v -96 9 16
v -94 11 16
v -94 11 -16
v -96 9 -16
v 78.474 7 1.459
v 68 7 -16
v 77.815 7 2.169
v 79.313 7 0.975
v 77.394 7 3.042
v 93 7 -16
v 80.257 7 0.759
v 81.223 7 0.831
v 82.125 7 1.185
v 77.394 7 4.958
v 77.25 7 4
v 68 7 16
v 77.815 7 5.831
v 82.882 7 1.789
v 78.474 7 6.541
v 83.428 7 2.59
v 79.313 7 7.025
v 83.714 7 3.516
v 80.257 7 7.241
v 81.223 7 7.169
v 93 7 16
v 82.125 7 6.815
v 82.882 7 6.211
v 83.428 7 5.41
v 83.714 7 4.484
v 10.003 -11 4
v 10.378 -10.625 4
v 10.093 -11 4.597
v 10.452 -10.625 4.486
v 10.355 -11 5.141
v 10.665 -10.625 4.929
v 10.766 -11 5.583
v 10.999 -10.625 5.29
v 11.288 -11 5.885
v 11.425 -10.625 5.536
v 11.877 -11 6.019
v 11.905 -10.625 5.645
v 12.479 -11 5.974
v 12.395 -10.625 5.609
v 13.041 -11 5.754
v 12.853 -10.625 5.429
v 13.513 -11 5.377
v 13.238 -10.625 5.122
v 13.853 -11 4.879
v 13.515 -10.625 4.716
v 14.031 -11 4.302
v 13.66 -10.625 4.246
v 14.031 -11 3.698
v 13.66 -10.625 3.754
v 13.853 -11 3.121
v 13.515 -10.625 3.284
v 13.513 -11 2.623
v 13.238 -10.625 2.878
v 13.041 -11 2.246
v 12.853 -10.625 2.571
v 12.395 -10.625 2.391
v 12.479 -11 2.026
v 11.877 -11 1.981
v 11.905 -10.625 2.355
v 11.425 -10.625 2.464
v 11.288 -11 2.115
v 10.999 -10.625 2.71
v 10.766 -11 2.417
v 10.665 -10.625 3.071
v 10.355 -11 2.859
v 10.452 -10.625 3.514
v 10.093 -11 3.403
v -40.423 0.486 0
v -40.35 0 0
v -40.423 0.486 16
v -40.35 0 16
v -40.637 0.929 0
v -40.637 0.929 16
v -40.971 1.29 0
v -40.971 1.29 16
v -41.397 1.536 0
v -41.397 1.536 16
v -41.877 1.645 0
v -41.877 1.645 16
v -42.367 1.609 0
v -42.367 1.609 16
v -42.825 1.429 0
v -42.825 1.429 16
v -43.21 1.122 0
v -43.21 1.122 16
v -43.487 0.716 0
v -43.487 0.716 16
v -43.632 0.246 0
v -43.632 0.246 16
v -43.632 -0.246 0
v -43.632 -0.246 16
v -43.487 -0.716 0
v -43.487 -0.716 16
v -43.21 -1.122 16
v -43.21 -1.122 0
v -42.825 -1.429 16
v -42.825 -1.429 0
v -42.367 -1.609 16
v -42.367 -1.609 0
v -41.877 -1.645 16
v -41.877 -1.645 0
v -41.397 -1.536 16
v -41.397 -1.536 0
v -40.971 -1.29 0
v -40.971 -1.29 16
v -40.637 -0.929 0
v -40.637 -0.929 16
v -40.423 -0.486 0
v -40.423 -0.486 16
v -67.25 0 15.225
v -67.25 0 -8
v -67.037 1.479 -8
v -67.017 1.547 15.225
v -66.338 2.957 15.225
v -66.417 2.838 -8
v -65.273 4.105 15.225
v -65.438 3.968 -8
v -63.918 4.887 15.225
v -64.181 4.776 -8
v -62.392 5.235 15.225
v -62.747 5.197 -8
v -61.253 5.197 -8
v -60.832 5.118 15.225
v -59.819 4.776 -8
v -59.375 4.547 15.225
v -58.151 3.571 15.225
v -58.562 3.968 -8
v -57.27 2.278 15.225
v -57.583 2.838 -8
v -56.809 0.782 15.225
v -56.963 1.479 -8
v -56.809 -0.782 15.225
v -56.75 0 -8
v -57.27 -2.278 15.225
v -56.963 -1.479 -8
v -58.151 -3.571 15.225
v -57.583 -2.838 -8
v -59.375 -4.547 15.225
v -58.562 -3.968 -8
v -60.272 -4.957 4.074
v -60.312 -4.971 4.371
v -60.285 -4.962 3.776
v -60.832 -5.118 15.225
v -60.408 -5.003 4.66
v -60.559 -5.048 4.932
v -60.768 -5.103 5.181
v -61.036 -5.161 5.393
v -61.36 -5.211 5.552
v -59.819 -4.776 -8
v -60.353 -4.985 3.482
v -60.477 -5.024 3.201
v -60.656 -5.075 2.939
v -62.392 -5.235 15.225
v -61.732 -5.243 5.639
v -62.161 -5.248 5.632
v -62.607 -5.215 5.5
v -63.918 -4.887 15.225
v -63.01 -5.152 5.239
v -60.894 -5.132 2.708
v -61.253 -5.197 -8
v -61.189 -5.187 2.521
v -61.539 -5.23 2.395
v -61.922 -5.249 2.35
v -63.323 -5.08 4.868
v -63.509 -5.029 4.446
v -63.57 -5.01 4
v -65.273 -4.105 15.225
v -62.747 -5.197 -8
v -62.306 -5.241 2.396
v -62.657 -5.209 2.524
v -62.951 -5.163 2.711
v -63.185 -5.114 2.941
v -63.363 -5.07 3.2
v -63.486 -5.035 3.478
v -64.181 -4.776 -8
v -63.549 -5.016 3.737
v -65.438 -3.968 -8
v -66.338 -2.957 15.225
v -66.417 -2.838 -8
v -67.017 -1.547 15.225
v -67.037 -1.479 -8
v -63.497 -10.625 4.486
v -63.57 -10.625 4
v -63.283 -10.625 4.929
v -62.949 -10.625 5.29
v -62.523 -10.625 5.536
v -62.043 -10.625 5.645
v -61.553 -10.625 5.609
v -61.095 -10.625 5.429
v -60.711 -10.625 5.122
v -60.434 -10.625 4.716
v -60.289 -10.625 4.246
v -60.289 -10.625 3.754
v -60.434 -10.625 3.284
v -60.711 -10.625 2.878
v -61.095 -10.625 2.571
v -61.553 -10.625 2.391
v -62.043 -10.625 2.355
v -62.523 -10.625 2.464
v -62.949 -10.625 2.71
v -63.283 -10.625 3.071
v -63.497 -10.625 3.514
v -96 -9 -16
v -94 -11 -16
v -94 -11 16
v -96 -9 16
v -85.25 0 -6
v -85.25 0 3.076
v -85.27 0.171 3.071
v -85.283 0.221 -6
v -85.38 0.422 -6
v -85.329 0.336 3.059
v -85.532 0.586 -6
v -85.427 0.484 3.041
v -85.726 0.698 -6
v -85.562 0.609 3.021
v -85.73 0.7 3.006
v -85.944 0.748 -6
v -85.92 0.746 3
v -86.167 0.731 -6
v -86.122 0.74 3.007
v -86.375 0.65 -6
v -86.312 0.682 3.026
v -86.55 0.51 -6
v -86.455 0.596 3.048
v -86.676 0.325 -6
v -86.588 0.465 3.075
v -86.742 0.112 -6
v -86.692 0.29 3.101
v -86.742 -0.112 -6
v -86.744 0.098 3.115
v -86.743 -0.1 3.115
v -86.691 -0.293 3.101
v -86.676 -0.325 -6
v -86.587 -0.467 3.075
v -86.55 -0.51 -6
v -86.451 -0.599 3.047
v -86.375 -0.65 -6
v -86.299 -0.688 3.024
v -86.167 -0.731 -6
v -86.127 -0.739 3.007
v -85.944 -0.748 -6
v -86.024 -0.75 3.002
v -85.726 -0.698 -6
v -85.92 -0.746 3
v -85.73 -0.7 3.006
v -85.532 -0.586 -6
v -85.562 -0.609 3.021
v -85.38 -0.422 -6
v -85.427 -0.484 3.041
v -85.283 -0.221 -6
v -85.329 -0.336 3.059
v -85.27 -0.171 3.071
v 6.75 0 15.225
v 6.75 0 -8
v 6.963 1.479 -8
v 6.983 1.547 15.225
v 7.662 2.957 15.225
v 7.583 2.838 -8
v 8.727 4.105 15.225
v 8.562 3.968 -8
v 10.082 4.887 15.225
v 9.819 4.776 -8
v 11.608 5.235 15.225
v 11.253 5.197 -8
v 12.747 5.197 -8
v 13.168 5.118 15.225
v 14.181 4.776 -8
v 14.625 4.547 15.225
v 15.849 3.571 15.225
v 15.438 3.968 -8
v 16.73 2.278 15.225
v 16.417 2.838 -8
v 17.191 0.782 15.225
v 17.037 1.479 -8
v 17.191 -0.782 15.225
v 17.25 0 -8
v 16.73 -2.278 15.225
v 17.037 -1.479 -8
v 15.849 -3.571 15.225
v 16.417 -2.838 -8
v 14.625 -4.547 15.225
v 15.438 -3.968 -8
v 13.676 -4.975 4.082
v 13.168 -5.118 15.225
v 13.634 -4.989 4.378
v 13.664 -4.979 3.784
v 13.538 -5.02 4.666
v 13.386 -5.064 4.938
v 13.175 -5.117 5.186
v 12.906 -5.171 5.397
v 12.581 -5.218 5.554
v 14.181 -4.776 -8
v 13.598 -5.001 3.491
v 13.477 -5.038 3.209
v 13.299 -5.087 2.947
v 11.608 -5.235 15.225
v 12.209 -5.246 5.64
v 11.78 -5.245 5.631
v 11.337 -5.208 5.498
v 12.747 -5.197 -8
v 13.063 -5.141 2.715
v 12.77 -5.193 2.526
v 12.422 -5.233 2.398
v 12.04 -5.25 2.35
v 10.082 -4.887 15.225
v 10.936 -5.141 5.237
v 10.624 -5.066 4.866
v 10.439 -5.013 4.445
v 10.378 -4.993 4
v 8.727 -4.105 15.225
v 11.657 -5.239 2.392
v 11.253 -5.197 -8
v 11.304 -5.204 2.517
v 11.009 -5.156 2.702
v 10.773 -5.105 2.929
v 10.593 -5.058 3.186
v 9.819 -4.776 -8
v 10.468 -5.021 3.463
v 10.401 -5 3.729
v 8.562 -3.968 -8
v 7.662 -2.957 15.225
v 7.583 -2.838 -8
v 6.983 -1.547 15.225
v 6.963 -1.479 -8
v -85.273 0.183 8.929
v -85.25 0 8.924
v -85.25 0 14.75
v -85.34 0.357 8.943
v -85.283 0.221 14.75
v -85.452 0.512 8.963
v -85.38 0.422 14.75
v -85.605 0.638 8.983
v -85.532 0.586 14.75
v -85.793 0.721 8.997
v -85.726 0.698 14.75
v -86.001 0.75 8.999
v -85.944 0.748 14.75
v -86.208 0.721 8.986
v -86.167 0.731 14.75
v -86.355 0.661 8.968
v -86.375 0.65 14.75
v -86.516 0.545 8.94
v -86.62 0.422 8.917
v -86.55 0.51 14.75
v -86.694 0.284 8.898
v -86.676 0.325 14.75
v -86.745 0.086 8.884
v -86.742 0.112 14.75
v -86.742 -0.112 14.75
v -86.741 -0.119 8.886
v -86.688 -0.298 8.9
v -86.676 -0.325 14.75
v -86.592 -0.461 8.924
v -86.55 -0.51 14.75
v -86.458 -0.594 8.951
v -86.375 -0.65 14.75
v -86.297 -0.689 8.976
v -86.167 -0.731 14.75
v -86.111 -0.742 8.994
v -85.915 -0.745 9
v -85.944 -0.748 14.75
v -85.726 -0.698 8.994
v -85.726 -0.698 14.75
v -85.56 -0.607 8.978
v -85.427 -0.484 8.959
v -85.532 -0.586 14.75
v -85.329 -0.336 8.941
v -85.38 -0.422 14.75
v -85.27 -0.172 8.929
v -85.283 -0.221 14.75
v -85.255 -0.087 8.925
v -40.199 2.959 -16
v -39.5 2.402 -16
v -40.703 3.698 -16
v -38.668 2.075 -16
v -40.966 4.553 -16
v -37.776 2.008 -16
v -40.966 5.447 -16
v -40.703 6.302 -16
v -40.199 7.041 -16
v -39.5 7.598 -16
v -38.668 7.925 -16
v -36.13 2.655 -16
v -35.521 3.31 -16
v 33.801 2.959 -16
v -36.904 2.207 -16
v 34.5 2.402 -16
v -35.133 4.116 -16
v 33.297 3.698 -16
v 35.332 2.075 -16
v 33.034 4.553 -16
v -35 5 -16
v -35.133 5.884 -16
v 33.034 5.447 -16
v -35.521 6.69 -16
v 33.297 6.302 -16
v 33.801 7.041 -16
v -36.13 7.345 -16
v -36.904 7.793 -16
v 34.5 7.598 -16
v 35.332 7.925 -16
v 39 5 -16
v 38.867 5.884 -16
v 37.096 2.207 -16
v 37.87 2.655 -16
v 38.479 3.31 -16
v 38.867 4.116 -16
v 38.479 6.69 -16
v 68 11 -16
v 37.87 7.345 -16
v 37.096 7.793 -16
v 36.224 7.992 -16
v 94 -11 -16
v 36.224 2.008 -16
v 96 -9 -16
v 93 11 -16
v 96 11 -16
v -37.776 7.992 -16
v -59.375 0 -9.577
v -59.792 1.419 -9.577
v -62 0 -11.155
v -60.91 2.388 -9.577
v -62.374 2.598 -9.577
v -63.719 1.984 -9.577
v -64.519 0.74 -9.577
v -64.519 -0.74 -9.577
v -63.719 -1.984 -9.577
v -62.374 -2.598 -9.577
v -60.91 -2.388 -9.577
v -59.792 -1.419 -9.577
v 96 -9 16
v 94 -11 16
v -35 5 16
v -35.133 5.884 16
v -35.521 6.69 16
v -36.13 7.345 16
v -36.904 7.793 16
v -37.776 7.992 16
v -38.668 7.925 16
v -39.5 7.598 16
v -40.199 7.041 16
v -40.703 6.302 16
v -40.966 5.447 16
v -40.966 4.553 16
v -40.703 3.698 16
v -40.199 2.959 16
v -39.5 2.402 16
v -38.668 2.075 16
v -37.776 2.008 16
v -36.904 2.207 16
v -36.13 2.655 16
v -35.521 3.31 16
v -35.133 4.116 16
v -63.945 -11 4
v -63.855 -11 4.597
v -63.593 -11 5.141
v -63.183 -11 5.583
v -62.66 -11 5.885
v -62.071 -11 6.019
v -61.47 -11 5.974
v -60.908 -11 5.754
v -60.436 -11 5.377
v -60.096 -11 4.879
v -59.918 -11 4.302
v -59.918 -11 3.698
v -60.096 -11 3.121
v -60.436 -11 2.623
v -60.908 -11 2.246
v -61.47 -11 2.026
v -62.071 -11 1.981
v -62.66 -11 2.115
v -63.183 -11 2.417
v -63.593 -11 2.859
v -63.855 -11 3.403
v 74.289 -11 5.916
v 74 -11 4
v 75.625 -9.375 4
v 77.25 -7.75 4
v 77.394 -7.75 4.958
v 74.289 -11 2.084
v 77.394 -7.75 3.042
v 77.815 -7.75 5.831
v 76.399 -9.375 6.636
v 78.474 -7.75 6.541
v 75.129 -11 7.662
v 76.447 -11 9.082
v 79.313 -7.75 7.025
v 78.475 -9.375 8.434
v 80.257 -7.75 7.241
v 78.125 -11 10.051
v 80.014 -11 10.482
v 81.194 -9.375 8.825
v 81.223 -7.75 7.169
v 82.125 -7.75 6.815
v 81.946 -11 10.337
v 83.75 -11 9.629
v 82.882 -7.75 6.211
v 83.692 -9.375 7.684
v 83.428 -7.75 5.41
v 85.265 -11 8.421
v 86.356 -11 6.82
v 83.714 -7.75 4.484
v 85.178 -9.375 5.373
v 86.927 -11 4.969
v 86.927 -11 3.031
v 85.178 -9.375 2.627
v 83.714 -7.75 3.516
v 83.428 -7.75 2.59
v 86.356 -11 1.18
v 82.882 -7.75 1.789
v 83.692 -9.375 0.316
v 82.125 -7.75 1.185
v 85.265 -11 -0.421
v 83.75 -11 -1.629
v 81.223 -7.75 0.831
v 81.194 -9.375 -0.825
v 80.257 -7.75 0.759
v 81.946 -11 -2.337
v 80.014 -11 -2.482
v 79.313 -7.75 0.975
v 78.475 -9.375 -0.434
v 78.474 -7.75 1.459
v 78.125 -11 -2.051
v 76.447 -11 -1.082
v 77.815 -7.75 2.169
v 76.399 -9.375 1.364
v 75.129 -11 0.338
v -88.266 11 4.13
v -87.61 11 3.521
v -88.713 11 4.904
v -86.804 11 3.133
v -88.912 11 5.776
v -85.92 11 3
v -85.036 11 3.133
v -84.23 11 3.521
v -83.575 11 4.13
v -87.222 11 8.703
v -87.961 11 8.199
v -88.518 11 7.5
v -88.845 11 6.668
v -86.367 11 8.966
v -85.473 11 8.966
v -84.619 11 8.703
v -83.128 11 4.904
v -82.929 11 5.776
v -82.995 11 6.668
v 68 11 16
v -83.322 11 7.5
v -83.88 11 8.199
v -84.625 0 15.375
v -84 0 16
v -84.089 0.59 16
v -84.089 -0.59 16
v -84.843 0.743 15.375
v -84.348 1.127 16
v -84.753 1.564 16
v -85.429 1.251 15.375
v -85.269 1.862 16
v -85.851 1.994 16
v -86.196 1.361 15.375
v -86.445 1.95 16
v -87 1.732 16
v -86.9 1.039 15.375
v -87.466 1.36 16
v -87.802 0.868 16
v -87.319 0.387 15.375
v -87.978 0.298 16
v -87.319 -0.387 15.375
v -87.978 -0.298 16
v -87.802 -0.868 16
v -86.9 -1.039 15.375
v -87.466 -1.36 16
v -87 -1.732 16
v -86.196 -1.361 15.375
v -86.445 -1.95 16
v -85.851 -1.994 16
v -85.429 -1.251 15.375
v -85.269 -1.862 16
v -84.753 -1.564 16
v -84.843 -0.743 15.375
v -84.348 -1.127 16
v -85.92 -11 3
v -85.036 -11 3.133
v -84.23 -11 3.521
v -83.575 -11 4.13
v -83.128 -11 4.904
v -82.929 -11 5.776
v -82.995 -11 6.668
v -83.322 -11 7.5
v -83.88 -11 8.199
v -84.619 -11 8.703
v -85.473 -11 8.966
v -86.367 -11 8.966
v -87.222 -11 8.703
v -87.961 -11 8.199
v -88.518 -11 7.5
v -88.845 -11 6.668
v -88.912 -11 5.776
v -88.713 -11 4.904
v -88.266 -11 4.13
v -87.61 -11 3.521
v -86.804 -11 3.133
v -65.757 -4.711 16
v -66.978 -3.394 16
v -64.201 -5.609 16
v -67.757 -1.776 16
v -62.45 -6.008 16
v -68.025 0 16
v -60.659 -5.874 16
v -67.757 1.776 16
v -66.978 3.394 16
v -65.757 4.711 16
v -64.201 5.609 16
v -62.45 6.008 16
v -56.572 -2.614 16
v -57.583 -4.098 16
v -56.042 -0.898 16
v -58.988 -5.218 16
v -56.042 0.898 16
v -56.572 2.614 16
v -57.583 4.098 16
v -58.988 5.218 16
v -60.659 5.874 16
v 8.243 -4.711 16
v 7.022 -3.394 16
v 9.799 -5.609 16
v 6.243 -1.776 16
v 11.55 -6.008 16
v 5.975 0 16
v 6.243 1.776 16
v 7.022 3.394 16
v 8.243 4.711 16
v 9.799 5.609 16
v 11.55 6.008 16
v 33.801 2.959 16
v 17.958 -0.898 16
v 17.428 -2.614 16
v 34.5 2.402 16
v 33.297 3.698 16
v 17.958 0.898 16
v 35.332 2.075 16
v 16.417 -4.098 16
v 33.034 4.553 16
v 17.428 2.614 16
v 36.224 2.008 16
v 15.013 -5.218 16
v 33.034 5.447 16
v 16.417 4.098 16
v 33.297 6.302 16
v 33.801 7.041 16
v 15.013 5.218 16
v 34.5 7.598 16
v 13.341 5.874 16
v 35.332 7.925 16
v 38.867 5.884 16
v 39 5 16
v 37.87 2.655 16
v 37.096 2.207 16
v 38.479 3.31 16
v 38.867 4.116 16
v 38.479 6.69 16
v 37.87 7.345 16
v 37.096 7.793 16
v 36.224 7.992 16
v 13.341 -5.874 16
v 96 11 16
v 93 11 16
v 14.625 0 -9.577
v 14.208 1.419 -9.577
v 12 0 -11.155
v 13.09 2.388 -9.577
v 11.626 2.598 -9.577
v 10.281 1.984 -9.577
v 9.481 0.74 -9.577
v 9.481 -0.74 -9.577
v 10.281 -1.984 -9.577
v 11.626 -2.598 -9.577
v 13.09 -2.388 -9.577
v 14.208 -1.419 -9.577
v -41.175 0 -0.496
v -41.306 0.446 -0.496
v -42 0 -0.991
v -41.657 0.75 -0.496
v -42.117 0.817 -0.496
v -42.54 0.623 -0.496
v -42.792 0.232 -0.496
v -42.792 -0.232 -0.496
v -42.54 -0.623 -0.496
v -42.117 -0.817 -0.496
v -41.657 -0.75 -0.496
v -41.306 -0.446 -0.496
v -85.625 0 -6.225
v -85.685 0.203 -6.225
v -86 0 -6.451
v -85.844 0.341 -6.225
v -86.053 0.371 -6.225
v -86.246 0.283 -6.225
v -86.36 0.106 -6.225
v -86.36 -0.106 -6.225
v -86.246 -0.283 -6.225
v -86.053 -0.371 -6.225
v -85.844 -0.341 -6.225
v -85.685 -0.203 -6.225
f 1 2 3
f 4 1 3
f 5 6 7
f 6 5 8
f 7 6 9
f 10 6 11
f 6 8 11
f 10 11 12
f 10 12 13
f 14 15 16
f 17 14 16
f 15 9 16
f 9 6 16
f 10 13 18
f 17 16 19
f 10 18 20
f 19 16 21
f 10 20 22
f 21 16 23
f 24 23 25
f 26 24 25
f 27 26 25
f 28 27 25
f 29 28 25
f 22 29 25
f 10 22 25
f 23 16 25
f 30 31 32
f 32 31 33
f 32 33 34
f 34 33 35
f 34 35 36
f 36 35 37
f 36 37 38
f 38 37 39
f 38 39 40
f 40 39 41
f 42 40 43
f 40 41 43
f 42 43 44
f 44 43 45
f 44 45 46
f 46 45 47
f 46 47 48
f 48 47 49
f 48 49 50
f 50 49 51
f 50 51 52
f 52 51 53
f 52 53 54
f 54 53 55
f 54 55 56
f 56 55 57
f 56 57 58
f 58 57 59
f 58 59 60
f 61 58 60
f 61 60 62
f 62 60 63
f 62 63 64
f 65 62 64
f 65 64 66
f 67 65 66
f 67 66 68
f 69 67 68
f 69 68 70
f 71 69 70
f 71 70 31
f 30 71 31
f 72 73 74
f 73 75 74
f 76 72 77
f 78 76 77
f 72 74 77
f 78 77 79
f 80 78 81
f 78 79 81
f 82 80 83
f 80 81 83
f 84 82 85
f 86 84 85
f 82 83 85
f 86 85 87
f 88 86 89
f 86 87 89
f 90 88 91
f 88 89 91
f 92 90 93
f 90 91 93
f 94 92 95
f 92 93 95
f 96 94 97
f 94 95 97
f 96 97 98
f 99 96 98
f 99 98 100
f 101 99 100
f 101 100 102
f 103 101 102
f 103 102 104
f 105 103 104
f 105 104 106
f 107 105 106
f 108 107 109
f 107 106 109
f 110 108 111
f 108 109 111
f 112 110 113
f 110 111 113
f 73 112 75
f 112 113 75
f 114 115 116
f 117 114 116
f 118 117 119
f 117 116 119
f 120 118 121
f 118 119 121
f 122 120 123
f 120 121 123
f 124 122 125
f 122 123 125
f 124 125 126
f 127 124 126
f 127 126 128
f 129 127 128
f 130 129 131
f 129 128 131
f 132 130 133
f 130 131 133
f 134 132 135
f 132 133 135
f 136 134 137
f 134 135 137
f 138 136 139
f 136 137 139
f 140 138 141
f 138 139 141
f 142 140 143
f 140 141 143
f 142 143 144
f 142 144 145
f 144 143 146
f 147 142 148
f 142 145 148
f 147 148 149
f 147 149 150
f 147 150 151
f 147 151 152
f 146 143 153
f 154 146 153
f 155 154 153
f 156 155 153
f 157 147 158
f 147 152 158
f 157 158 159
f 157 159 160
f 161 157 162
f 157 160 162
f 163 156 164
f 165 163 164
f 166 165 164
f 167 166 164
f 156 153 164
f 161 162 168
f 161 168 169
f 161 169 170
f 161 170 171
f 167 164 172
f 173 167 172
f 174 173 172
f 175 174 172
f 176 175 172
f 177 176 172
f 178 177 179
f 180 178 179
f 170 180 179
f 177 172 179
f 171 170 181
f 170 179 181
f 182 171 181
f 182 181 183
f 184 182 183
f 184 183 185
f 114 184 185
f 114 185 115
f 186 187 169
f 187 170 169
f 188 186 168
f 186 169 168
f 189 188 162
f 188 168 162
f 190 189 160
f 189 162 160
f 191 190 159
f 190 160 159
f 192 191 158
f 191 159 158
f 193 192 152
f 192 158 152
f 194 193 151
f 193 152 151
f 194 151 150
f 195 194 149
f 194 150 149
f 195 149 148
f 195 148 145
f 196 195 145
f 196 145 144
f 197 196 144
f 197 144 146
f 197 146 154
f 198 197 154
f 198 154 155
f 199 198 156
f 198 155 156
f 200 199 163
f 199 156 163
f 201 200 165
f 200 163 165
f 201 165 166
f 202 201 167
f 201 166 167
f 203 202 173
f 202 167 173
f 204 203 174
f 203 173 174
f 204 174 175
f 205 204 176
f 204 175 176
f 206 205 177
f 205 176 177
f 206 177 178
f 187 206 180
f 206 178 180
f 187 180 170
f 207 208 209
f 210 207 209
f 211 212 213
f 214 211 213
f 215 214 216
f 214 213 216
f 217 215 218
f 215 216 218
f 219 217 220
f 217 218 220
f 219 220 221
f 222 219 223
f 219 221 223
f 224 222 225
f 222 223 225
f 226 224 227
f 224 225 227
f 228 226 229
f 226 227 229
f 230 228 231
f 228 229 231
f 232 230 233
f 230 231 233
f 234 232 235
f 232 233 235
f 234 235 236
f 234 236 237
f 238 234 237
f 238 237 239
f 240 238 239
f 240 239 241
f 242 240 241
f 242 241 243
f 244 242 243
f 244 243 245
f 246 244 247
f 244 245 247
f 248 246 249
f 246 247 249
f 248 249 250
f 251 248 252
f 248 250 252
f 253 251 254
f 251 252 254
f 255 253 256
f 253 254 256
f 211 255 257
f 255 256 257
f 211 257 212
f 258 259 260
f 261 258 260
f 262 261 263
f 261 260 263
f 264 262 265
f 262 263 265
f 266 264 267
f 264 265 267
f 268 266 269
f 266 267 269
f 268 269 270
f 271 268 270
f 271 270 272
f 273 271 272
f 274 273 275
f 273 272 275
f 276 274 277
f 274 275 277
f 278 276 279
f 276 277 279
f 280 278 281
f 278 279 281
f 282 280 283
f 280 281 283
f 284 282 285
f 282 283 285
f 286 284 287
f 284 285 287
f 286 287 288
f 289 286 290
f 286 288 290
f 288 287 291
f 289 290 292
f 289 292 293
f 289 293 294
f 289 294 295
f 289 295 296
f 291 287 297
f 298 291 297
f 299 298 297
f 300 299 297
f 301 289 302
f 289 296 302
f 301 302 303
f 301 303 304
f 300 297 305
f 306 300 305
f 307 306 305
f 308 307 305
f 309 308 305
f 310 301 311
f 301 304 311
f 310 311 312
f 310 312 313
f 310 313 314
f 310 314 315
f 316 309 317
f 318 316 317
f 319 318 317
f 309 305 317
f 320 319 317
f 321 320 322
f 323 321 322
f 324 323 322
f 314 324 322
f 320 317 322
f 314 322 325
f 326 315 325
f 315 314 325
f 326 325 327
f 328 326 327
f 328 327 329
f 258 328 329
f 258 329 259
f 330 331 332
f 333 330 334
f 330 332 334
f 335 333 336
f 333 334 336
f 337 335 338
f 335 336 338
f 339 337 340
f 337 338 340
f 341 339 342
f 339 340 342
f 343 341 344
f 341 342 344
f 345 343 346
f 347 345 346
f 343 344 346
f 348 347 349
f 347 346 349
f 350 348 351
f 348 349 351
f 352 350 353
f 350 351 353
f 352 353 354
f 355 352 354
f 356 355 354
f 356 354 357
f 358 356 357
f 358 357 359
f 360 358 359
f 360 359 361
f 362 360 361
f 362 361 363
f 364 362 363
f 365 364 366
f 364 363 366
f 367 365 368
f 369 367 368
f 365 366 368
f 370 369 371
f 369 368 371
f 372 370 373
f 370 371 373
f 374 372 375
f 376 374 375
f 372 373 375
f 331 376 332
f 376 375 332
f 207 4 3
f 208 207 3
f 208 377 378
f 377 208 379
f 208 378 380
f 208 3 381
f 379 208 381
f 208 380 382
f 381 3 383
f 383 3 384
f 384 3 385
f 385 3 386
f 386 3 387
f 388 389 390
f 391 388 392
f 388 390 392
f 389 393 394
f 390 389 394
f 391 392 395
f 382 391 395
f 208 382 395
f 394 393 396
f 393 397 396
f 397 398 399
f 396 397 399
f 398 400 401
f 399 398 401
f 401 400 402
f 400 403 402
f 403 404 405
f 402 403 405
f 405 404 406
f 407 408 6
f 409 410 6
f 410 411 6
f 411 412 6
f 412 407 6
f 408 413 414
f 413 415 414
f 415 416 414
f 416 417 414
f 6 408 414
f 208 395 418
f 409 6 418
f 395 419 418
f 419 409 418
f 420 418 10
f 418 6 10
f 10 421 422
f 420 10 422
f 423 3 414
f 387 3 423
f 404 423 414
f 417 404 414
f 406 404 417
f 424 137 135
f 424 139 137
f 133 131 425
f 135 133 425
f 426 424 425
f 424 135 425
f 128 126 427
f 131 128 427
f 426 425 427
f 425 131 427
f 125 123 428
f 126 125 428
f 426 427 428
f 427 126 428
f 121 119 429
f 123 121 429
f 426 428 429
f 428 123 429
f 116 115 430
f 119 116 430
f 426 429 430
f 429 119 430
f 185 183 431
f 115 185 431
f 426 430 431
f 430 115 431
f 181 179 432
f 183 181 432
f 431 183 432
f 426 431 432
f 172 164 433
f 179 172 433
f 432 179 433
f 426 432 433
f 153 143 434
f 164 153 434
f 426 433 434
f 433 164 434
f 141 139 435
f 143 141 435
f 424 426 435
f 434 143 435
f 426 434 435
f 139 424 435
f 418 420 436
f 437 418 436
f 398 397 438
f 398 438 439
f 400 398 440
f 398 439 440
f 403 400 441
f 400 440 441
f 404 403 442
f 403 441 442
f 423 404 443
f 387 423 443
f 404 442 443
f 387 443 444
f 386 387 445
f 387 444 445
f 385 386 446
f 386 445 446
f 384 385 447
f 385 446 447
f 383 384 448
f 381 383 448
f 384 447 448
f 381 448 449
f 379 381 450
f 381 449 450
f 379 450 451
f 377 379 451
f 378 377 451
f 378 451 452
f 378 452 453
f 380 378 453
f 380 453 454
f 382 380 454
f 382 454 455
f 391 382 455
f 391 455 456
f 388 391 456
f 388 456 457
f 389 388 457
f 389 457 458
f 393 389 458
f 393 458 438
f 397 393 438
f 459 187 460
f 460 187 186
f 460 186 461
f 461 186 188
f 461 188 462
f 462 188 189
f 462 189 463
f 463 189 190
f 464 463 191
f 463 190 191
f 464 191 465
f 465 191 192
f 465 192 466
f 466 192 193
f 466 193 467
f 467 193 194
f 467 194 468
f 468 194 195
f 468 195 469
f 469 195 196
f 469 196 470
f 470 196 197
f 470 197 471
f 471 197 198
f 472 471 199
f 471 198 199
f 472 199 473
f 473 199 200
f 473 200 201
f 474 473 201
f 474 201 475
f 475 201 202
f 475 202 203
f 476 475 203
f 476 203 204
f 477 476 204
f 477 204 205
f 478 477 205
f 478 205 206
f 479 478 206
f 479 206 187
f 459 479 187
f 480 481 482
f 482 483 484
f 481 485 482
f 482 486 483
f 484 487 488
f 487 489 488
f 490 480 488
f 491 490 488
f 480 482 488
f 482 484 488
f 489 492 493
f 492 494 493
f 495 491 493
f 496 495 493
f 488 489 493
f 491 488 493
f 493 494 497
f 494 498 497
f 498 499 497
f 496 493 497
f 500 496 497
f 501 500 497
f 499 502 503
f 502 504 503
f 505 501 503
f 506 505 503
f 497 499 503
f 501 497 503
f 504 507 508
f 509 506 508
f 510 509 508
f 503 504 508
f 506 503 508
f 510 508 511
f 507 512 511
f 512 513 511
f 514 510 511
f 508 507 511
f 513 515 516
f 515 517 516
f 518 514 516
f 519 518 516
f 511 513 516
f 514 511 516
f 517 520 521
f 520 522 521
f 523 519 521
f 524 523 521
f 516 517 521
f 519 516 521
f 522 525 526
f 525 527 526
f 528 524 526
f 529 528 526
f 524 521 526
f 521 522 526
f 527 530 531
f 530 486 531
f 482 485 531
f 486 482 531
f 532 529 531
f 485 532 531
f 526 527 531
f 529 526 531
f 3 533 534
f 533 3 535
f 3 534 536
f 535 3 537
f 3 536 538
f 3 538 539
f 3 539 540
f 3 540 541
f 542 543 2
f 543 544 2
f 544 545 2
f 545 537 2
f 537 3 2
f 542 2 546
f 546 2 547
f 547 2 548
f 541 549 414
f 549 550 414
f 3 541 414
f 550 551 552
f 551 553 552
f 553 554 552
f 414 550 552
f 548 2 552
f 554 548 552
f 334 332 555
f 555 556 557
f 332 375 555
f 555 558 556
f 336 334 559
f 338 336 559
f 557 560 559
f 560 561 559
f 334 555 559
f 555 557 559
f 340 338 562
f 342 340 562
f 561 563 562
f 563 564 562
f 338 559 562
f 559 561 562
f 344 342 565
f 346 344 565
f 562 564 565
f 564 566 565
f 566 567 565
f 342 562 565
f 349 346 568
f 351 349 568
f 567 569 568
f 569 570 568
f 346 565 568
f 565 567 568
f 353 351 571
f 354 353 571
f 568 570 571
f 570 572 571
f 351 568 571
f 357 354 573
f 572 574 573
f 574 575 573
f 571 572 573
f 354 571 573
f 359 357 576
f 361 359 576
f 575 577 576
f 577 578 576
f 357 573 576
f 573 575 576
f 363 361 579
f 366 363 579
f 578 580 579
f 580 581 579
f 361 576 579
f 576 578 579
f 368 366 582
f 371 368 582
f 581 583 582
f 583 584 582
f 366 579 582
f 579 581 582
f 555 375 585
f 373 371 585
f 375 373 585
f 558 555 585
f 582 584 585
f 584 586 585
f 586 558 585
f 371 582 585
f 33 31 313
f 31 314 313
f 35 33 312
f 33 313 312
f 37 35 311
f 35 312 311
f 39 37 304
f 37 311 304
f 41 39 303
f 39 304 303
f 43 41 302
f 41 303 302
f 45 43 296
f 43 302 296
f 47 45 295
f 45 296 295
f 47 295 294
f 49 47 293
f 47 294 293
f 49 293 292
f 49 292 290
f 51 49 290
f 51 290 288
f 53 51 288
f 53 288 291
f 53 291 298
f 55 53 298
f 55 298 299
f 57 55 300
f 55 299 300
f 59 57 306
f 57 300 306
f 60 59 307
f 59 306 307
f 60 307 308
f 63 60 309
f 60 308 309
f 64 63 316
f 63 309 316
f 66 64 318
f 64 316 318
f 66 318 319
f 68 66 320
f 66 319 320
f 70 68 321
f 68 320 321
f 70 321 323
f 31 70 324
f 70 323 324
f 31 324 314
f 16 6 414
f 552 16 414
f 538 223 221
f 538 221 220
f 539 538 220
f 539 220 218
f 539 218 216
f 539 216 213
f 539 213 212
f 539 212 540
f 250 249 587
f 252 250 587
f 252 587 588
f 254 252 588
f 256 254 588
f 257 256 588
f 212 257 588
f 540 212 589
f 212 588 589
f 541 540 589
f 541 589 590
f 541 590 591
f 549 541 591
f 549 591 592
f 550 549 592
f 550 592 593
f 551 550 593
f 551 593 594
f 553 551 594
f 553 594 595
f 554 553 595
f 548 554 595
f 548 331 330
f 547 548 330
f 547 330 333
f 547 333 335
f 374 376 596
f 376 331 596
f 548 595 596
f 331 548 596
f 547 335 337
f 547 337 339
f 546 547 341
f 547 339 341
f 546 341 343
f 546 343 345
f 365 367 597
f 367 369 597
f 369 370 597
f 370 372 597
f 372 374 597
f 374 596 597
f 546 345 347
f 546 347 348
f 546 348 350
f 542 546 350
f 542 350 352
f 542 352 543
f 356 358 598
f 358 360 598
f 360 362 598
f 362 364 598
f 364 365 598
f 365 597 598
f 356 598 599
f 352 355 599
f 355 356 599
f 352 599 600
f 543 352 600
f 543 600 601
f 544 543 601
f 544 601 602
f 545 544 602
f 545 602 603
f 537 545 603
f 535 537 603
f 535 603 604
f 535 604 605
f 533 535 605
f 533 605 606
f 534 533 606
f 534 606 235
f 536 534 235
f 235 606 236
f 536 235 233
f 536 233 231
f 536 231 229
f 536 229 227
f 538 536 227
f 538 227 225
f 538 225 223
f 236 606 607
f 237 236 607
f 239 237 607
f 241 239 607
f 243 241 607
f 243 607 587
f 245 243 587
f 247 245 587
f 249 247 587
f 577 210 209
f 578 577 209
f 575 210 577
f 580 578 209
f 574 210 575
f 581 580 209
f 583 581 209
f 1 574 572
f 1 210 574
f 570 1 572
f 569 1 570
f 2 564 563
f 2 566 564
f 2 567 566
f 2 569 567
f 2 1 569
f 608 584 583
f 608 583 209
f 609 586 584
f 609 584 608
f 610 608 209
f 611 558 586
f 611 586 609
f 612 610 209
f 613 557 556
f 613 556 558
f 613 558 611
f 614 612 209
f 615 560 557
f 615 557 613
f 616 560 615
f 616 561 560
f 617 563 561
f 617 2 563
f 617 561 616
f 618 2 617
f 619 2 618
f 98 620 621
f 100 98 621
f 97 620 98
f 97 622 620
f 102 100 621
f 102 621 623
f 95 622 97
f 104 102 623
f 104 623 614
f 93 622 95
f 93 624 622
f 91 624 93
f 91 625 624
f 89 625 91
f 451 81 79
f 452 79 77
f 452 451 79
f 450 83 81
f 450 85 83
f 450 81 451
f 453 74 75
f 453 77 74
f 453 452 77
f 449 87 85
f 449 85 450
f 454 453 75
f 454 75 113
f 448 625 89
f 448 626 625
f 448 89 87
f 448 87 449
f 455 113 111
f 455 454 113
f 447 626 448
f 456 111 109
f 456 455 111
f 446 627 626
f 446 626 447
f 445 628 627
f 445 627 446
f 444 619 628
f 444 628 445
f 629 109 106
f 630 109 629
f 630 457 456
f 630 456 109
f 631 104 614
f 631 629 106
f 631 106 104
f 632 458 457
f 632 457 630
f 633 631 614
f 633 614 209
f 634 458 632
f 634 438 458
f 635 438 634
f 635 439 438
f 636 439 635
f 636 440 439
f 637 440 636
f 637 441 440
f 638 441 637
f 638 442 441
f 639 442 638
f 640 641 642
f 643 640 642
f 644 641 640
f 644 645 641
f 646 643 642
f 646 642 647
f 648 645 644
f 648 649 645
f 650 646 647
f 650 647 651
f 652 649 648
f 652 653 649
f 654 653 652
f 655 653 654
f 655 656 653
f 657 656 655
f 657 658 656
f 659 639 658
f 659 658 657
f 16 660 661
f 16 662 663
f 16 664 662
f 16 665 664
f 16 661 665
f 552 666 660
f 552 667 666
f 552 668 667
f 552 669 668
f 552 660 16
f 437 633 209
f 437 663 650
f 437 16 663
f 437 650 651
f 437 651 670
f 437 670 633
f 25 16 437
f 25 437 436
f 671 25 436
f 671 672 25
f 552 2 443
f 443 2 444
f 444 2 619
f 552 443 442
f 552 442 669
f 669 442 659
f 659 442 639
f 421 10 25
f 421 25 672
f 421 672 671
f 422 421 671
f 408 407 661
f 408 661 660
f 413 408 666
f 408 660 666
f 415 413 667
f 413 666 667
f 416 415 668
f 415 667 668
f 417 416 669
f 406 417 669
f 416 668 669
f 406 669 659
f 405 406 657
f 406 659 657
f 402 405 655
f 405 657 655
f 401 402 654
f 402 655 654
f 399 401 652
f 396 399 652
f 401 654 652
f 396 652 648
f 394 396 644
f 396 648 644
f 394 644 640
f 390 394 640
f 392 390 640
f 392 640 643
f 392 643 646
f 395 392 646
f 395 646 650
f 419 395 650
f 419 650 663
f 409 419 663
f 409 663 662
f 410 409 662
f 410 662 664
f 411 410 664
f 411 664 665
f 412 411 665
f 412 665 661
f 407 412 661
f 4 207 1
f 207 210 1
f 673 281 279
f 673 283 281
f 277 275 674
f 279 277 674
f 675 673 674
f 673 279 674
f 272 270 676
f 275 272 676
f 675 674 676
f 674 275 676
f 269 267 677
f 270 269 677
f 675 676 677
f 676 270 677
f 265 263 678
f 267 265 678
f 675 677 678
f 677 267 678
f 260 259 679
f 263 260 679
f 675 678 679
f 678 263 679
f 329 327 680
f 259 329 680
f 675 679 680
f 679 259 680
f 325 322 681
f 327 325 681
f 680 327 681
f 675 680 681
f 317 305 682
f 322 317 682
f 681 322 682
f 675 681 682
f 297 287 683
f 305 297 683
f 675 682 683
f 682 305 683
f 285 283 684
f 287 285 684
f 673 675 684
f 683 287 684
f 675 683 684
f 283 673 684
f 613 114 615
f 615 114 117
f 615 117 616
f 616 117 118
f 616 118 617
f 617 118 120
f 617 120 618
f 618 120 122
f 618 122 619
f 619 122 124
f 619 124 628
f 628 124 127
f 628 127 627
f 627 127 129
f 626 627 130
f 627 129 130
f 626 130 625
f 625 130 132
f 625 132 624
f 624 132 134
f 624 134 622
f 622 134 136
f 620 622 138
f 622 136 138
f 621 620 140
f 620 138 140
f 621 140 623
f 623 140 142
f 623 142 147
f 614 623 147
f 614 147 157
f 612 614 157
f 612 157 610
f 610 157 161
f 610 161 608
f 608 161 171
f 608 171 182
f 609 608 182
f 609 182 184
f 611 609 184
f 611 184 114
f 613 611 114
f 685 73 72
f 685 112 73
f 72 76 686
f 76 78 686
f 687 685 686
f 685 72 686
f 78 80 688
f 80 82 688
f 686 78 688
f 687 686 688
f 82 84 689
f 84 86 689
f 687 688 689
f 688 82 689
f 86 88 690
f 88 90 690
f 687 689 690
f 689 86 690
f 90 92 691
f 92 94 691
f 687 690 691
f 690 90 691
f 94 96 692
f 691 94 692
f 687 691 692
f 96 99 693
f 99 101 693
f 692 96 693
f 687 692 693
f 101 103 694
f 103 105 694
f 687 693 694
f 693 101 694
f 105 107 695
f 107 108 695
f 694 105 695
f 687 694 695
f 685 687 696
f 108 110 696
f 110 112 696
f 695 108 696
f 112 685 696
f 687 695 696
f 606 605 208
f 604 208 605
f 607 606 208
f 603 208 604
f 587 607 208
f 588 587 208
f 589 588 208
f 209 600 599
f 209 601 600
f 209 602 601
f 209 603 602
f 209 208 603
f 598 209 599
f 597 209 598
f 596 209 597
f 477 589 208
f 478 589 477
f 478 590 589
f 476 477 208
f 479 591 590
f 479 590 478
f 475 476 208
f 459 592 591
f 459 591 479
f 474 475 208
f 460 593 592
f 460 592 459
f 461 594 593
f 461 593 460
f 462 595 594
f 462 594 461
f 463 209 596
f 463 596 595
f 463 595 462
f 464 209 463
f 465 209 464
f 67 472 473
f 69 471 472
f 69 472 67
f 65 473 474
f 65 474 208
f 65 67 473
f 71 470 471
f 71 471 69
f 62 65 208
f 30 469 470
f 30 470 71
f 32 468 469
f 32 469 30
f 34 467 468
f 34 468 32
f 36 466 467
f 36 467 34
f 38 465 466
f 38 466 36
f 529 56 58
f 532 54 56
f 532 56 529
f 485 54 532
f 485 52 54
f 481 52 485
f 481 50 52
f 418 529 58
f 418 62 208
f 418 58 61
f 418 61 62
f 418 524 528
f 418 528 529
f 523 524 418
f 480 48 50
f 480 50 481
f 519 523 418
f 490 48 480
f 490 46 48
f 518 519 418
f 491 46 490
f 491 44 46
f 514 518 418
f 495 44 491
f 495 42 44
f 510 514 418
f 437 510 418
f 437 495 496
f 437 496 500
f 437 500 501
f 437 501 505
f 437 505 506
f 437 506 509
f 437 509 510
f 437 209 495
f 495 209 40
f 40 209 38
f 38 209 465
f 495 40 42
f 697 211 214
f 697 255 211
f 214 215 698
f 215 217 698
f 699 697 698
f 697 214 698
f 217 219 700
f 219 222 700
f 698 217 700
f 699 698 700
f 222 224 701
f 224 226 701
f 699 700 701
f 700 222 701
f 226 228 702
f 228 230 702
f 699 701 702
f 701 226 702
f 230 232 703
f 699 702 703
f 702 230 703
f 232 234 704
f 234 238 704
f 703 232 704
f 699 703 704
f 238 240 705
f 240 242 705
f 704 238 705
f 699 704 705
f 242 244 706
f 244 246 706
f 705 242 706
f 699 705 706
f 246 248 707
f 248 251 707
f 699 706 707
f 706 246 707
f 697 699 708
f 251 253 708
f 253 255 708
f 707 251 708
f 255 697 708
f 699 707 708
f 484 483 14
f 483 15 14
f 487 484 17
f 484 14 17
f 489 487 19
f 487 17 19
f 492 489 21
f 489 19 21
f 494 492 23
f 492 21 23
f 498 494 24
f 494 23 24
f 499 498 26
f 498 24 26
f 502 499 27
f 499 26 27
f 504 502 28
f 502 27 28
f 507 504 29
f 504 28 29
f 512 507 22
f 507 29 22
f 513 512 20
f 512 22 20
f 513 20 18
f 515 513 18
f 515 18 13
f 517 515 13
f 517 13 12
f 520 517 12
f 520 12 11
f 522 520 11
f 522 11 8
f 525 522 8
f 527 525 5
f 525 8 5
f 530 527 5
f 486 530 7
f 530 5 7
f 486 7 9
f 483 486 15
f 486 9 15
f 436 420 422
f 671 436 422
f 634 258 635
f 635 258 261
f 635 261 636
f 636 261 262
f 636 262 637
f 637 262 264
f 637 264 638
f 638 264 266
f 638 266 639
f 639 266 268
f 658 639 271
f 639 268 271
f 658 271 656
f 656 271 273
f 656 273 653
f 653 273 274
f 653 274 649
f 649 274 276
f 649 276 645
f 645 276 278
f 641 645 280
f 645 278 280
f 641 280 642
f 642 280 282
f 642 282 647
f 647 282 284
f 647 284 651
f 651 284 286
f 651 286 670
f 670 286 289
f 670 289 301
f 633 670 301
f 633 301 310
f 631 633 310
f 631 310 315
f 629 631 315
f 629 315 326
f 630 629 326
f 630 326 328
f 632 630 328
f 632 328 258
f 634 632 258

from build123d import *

# Parameters (mm, degrees)
SKETCH1_W                                        = 192
SKETCH1_H                                        = 22
BOSS_EXTRUDE1_DEPTH                              = 16
SKETCH3_W                                        = 25
SKETCH3_H                                        = 4
CUT_EXTRUDE4_DEPTH                               = 32
M12X1_5_TAPPED_HOLE5_D                           = 10.5
M12X1_5_TAPPED_HOLE5_DEPTH                       = 24
M12X1_5_TAPPED_HOLE5_CSINK_D                     = 12.05
M12X1_5_TAPPED_HOLE5_CSINK_ANGLE                 = 90
M12X1_5_TAPPED_HOLE5_TIP                         = 3.15451825
M4X0_7_TAPPED_HOLE1_D                            = 3.3
M4X0_7_TAPPED_HOLE1_DEPTH                        = 11.5
M4X0_7_TAPPED_HOLE1_CSINK_D                      = 4.05
M4X0_7_TAPPED_HOLE1_CSINK_ANGLE                  = 90
M4X0_7_TAPPED_HOLE1_TIP                          = 0.991420021
SKETCH18_R                                       = 3
CUT_EXTRUDE5_DEPTH                               = 102.788997441
CHAMFER1_SIZE                                    = 2
CSK_FOR_M10_FLAT_HEAD_MACHINE_SCREW2_D           = 6.5
CSK_FOR_M10_FLAT_HEAD_MACHINE_SCREW2_CSINK_D     = 13
CSK_FOR_M10_FLAT_HEAD_MACHINE_SCREW2_CSINK_ANGLE = 90
SKETCH24_R                                       = 3
CUT_EXTRUDE6_DEPTH                               = 100.779757466


# Read off the part's stored shape, not the designer's step: CSK for M4 Countersunk Flat Head Screw2, M4 Tapped Hole2
with BuildPart() as part:
    # Sketch1 → Boss-Extrude1 (new, symmetric)
    with BuildSketch(Plane.XY):
        Rectangle(SKETCH1_W, SKETCH1_H)
    extrude(amount=BOSS_EXTRUDE1_DEPTH, both=True)

    # Sketch3 → Cut-Extrude4 (cut)
    with BuildSketch(Plane.XY.offset(16)):
        with Locations((80.5, 9)):
            Rectangle(SKETCH3_W, SKETCH3_H)
    extrude(amount=-CUT_EXTRUDE4_DEPTH, mode=Mode.SUBTRACT)

    # M12x1.5 Tapped Hole5
    with Locations(Plane.XY.offset(16)):
        with Locations((12, 0), (-62, 0)):
            CounterSinkHole(M12X1_5_TAPPED_HOLE5_D / 2, M12X1_5_TAPPED_HOLE5_CSINK_D / 2, depth=M12X1_5_TAPPED_HOLE5_DEPTH, counter_sink_angle=M12X1_5_TAPPED_HOLE5_CSINK_ANGLE)
            with Locations((0, 0, -(M12X1_5_TAPPED_HOLE5_DEPTH + M12X1_5_TAPPED_HOLE5_TIP / 2))):  # 118° drill point
                Cone(0, M12X1_5_TAPPED_HOLE5_D / 2, M12X1_5_TAPPED_HOLE5_TIP, mode=Mode.SUBTRACT)

    # M4x0.7 Tapped Hole1
    with Locations(Plane.XZ.offset(11)):
        with Locations((-61.920151764, 4), (12.028225588, 4)):
            CounterSinkHole(M4X0_7_TAPPED_HOLE1_D / 2, M4X0_7_TAPPED_HOLE1_CSINK_D / 2, depth=M4X0_7_TAPPED_HOLE1_DEPTH, counter_sink_angle=M4X0_7_TAPPED_HOLE1_CSINK_ANGLE)
            with Locations((0, 0, -(M4X0_7_TAPPED_HOLE1_DEPTH + M4X0_7_TAPPED_HOLE1_TIP / 2))):  # 118° drill point
                Cone(0, M4X0_7_TAPPED_HOLE1_D / 2, M4X0_7_TAPPED_HOLE1_TIP, mode=Mode.SUBTRACT)

    # Sketch18 → Cut-Extrude5 (cut, through all)
    with BuildSketch(Plane.XY.offset(16)):
        with Locations((-38, 5)):
            Circle(SKETCH18_R)
        with Locations((36, 5)):
            Circle(SKETCH18_R)
    extrude(amount=-CUT_EXTRUDE5_DEPTH, mode=Mode.SUBTRACT)

    # Chamfer1
    chamfer1_edges = [part.edges().sort_by_distance(p)[0] for p in [
        (96, -11, 0),
        (-96, -11, 0),
        (-96, 11, 0),
    ]]
    chamfer(chamfer1_edges, length=CHAMFER1_SIZE)

    # CSK for M10 Flat Head Machine Screw2 (through all)
    with Locations(Plane.XZ.offset(11)):
        with Locations((80.5, 4)):
            CounterSinkHole(CSK_FOR_M10_FLAT_HEAD_MACHINE_SCREW2_D / 2, CSK_FOR_M10_FLAT_HEAD_MACHINE_SCREW2_CSINK_D / 2, counter_sink_angle=CSK_FOR_M10_FLAT_HEAD_MACHINE_SCREW2_CSINK_ANGLE)

    # Sketch24 → Cut-Extrude6 (cut, through all)
    with BuildSketch(Plane.XZ.offset(11)):
        with Locations(Location((-85.920151764, 6, 0), (0, 0, 270))):
            Circle(SKETCH24_R)
    extrude(amount=-CUT_EXTRUDE6_DEPTH, mode=Mode.SUBTRACT)

    # CSK for M4 Countersunk Flat Head Scr 2 → CSK for M4 Countersunk Flat Head Screw2 (revolve, cut)
    with BuildSketch(Plane(origin=(-86, 0, 0), x_dir=(1, 0, 0), z_dir=(0, -1, 0))):
        Polygon((0, 8.882881782), (0.75, 8.882881782), (0.75, 14.75), (2, 16), (0, 16), align=None)
        Polygon((0.75, -6), (0.75, 3.117108952), (0, 3.117108952), (0, -6.450645464), align=None)
    revolve(axis=Axis((-86, 0, 0), (0, 0, 1)), mode=Mode.SUBTRACT)

    # M4 Tapped Hole2 outline → M4 Tapped Hole2 (revolve, cut)
    with BuildSketch(Plane(origin=(-42, 0, 0), x_dir=(1, 0, 0), z_dir=(0, -1, 0))):
        Polygon((0, 16), (0, -0.991420021), (1.65, 0), (1.65, 16), align=None)
    revolve(axis=Axis((-42, 0, 0), (0, 0, 1)), mode=Mode.SUBTRACT)


solid = part.part
